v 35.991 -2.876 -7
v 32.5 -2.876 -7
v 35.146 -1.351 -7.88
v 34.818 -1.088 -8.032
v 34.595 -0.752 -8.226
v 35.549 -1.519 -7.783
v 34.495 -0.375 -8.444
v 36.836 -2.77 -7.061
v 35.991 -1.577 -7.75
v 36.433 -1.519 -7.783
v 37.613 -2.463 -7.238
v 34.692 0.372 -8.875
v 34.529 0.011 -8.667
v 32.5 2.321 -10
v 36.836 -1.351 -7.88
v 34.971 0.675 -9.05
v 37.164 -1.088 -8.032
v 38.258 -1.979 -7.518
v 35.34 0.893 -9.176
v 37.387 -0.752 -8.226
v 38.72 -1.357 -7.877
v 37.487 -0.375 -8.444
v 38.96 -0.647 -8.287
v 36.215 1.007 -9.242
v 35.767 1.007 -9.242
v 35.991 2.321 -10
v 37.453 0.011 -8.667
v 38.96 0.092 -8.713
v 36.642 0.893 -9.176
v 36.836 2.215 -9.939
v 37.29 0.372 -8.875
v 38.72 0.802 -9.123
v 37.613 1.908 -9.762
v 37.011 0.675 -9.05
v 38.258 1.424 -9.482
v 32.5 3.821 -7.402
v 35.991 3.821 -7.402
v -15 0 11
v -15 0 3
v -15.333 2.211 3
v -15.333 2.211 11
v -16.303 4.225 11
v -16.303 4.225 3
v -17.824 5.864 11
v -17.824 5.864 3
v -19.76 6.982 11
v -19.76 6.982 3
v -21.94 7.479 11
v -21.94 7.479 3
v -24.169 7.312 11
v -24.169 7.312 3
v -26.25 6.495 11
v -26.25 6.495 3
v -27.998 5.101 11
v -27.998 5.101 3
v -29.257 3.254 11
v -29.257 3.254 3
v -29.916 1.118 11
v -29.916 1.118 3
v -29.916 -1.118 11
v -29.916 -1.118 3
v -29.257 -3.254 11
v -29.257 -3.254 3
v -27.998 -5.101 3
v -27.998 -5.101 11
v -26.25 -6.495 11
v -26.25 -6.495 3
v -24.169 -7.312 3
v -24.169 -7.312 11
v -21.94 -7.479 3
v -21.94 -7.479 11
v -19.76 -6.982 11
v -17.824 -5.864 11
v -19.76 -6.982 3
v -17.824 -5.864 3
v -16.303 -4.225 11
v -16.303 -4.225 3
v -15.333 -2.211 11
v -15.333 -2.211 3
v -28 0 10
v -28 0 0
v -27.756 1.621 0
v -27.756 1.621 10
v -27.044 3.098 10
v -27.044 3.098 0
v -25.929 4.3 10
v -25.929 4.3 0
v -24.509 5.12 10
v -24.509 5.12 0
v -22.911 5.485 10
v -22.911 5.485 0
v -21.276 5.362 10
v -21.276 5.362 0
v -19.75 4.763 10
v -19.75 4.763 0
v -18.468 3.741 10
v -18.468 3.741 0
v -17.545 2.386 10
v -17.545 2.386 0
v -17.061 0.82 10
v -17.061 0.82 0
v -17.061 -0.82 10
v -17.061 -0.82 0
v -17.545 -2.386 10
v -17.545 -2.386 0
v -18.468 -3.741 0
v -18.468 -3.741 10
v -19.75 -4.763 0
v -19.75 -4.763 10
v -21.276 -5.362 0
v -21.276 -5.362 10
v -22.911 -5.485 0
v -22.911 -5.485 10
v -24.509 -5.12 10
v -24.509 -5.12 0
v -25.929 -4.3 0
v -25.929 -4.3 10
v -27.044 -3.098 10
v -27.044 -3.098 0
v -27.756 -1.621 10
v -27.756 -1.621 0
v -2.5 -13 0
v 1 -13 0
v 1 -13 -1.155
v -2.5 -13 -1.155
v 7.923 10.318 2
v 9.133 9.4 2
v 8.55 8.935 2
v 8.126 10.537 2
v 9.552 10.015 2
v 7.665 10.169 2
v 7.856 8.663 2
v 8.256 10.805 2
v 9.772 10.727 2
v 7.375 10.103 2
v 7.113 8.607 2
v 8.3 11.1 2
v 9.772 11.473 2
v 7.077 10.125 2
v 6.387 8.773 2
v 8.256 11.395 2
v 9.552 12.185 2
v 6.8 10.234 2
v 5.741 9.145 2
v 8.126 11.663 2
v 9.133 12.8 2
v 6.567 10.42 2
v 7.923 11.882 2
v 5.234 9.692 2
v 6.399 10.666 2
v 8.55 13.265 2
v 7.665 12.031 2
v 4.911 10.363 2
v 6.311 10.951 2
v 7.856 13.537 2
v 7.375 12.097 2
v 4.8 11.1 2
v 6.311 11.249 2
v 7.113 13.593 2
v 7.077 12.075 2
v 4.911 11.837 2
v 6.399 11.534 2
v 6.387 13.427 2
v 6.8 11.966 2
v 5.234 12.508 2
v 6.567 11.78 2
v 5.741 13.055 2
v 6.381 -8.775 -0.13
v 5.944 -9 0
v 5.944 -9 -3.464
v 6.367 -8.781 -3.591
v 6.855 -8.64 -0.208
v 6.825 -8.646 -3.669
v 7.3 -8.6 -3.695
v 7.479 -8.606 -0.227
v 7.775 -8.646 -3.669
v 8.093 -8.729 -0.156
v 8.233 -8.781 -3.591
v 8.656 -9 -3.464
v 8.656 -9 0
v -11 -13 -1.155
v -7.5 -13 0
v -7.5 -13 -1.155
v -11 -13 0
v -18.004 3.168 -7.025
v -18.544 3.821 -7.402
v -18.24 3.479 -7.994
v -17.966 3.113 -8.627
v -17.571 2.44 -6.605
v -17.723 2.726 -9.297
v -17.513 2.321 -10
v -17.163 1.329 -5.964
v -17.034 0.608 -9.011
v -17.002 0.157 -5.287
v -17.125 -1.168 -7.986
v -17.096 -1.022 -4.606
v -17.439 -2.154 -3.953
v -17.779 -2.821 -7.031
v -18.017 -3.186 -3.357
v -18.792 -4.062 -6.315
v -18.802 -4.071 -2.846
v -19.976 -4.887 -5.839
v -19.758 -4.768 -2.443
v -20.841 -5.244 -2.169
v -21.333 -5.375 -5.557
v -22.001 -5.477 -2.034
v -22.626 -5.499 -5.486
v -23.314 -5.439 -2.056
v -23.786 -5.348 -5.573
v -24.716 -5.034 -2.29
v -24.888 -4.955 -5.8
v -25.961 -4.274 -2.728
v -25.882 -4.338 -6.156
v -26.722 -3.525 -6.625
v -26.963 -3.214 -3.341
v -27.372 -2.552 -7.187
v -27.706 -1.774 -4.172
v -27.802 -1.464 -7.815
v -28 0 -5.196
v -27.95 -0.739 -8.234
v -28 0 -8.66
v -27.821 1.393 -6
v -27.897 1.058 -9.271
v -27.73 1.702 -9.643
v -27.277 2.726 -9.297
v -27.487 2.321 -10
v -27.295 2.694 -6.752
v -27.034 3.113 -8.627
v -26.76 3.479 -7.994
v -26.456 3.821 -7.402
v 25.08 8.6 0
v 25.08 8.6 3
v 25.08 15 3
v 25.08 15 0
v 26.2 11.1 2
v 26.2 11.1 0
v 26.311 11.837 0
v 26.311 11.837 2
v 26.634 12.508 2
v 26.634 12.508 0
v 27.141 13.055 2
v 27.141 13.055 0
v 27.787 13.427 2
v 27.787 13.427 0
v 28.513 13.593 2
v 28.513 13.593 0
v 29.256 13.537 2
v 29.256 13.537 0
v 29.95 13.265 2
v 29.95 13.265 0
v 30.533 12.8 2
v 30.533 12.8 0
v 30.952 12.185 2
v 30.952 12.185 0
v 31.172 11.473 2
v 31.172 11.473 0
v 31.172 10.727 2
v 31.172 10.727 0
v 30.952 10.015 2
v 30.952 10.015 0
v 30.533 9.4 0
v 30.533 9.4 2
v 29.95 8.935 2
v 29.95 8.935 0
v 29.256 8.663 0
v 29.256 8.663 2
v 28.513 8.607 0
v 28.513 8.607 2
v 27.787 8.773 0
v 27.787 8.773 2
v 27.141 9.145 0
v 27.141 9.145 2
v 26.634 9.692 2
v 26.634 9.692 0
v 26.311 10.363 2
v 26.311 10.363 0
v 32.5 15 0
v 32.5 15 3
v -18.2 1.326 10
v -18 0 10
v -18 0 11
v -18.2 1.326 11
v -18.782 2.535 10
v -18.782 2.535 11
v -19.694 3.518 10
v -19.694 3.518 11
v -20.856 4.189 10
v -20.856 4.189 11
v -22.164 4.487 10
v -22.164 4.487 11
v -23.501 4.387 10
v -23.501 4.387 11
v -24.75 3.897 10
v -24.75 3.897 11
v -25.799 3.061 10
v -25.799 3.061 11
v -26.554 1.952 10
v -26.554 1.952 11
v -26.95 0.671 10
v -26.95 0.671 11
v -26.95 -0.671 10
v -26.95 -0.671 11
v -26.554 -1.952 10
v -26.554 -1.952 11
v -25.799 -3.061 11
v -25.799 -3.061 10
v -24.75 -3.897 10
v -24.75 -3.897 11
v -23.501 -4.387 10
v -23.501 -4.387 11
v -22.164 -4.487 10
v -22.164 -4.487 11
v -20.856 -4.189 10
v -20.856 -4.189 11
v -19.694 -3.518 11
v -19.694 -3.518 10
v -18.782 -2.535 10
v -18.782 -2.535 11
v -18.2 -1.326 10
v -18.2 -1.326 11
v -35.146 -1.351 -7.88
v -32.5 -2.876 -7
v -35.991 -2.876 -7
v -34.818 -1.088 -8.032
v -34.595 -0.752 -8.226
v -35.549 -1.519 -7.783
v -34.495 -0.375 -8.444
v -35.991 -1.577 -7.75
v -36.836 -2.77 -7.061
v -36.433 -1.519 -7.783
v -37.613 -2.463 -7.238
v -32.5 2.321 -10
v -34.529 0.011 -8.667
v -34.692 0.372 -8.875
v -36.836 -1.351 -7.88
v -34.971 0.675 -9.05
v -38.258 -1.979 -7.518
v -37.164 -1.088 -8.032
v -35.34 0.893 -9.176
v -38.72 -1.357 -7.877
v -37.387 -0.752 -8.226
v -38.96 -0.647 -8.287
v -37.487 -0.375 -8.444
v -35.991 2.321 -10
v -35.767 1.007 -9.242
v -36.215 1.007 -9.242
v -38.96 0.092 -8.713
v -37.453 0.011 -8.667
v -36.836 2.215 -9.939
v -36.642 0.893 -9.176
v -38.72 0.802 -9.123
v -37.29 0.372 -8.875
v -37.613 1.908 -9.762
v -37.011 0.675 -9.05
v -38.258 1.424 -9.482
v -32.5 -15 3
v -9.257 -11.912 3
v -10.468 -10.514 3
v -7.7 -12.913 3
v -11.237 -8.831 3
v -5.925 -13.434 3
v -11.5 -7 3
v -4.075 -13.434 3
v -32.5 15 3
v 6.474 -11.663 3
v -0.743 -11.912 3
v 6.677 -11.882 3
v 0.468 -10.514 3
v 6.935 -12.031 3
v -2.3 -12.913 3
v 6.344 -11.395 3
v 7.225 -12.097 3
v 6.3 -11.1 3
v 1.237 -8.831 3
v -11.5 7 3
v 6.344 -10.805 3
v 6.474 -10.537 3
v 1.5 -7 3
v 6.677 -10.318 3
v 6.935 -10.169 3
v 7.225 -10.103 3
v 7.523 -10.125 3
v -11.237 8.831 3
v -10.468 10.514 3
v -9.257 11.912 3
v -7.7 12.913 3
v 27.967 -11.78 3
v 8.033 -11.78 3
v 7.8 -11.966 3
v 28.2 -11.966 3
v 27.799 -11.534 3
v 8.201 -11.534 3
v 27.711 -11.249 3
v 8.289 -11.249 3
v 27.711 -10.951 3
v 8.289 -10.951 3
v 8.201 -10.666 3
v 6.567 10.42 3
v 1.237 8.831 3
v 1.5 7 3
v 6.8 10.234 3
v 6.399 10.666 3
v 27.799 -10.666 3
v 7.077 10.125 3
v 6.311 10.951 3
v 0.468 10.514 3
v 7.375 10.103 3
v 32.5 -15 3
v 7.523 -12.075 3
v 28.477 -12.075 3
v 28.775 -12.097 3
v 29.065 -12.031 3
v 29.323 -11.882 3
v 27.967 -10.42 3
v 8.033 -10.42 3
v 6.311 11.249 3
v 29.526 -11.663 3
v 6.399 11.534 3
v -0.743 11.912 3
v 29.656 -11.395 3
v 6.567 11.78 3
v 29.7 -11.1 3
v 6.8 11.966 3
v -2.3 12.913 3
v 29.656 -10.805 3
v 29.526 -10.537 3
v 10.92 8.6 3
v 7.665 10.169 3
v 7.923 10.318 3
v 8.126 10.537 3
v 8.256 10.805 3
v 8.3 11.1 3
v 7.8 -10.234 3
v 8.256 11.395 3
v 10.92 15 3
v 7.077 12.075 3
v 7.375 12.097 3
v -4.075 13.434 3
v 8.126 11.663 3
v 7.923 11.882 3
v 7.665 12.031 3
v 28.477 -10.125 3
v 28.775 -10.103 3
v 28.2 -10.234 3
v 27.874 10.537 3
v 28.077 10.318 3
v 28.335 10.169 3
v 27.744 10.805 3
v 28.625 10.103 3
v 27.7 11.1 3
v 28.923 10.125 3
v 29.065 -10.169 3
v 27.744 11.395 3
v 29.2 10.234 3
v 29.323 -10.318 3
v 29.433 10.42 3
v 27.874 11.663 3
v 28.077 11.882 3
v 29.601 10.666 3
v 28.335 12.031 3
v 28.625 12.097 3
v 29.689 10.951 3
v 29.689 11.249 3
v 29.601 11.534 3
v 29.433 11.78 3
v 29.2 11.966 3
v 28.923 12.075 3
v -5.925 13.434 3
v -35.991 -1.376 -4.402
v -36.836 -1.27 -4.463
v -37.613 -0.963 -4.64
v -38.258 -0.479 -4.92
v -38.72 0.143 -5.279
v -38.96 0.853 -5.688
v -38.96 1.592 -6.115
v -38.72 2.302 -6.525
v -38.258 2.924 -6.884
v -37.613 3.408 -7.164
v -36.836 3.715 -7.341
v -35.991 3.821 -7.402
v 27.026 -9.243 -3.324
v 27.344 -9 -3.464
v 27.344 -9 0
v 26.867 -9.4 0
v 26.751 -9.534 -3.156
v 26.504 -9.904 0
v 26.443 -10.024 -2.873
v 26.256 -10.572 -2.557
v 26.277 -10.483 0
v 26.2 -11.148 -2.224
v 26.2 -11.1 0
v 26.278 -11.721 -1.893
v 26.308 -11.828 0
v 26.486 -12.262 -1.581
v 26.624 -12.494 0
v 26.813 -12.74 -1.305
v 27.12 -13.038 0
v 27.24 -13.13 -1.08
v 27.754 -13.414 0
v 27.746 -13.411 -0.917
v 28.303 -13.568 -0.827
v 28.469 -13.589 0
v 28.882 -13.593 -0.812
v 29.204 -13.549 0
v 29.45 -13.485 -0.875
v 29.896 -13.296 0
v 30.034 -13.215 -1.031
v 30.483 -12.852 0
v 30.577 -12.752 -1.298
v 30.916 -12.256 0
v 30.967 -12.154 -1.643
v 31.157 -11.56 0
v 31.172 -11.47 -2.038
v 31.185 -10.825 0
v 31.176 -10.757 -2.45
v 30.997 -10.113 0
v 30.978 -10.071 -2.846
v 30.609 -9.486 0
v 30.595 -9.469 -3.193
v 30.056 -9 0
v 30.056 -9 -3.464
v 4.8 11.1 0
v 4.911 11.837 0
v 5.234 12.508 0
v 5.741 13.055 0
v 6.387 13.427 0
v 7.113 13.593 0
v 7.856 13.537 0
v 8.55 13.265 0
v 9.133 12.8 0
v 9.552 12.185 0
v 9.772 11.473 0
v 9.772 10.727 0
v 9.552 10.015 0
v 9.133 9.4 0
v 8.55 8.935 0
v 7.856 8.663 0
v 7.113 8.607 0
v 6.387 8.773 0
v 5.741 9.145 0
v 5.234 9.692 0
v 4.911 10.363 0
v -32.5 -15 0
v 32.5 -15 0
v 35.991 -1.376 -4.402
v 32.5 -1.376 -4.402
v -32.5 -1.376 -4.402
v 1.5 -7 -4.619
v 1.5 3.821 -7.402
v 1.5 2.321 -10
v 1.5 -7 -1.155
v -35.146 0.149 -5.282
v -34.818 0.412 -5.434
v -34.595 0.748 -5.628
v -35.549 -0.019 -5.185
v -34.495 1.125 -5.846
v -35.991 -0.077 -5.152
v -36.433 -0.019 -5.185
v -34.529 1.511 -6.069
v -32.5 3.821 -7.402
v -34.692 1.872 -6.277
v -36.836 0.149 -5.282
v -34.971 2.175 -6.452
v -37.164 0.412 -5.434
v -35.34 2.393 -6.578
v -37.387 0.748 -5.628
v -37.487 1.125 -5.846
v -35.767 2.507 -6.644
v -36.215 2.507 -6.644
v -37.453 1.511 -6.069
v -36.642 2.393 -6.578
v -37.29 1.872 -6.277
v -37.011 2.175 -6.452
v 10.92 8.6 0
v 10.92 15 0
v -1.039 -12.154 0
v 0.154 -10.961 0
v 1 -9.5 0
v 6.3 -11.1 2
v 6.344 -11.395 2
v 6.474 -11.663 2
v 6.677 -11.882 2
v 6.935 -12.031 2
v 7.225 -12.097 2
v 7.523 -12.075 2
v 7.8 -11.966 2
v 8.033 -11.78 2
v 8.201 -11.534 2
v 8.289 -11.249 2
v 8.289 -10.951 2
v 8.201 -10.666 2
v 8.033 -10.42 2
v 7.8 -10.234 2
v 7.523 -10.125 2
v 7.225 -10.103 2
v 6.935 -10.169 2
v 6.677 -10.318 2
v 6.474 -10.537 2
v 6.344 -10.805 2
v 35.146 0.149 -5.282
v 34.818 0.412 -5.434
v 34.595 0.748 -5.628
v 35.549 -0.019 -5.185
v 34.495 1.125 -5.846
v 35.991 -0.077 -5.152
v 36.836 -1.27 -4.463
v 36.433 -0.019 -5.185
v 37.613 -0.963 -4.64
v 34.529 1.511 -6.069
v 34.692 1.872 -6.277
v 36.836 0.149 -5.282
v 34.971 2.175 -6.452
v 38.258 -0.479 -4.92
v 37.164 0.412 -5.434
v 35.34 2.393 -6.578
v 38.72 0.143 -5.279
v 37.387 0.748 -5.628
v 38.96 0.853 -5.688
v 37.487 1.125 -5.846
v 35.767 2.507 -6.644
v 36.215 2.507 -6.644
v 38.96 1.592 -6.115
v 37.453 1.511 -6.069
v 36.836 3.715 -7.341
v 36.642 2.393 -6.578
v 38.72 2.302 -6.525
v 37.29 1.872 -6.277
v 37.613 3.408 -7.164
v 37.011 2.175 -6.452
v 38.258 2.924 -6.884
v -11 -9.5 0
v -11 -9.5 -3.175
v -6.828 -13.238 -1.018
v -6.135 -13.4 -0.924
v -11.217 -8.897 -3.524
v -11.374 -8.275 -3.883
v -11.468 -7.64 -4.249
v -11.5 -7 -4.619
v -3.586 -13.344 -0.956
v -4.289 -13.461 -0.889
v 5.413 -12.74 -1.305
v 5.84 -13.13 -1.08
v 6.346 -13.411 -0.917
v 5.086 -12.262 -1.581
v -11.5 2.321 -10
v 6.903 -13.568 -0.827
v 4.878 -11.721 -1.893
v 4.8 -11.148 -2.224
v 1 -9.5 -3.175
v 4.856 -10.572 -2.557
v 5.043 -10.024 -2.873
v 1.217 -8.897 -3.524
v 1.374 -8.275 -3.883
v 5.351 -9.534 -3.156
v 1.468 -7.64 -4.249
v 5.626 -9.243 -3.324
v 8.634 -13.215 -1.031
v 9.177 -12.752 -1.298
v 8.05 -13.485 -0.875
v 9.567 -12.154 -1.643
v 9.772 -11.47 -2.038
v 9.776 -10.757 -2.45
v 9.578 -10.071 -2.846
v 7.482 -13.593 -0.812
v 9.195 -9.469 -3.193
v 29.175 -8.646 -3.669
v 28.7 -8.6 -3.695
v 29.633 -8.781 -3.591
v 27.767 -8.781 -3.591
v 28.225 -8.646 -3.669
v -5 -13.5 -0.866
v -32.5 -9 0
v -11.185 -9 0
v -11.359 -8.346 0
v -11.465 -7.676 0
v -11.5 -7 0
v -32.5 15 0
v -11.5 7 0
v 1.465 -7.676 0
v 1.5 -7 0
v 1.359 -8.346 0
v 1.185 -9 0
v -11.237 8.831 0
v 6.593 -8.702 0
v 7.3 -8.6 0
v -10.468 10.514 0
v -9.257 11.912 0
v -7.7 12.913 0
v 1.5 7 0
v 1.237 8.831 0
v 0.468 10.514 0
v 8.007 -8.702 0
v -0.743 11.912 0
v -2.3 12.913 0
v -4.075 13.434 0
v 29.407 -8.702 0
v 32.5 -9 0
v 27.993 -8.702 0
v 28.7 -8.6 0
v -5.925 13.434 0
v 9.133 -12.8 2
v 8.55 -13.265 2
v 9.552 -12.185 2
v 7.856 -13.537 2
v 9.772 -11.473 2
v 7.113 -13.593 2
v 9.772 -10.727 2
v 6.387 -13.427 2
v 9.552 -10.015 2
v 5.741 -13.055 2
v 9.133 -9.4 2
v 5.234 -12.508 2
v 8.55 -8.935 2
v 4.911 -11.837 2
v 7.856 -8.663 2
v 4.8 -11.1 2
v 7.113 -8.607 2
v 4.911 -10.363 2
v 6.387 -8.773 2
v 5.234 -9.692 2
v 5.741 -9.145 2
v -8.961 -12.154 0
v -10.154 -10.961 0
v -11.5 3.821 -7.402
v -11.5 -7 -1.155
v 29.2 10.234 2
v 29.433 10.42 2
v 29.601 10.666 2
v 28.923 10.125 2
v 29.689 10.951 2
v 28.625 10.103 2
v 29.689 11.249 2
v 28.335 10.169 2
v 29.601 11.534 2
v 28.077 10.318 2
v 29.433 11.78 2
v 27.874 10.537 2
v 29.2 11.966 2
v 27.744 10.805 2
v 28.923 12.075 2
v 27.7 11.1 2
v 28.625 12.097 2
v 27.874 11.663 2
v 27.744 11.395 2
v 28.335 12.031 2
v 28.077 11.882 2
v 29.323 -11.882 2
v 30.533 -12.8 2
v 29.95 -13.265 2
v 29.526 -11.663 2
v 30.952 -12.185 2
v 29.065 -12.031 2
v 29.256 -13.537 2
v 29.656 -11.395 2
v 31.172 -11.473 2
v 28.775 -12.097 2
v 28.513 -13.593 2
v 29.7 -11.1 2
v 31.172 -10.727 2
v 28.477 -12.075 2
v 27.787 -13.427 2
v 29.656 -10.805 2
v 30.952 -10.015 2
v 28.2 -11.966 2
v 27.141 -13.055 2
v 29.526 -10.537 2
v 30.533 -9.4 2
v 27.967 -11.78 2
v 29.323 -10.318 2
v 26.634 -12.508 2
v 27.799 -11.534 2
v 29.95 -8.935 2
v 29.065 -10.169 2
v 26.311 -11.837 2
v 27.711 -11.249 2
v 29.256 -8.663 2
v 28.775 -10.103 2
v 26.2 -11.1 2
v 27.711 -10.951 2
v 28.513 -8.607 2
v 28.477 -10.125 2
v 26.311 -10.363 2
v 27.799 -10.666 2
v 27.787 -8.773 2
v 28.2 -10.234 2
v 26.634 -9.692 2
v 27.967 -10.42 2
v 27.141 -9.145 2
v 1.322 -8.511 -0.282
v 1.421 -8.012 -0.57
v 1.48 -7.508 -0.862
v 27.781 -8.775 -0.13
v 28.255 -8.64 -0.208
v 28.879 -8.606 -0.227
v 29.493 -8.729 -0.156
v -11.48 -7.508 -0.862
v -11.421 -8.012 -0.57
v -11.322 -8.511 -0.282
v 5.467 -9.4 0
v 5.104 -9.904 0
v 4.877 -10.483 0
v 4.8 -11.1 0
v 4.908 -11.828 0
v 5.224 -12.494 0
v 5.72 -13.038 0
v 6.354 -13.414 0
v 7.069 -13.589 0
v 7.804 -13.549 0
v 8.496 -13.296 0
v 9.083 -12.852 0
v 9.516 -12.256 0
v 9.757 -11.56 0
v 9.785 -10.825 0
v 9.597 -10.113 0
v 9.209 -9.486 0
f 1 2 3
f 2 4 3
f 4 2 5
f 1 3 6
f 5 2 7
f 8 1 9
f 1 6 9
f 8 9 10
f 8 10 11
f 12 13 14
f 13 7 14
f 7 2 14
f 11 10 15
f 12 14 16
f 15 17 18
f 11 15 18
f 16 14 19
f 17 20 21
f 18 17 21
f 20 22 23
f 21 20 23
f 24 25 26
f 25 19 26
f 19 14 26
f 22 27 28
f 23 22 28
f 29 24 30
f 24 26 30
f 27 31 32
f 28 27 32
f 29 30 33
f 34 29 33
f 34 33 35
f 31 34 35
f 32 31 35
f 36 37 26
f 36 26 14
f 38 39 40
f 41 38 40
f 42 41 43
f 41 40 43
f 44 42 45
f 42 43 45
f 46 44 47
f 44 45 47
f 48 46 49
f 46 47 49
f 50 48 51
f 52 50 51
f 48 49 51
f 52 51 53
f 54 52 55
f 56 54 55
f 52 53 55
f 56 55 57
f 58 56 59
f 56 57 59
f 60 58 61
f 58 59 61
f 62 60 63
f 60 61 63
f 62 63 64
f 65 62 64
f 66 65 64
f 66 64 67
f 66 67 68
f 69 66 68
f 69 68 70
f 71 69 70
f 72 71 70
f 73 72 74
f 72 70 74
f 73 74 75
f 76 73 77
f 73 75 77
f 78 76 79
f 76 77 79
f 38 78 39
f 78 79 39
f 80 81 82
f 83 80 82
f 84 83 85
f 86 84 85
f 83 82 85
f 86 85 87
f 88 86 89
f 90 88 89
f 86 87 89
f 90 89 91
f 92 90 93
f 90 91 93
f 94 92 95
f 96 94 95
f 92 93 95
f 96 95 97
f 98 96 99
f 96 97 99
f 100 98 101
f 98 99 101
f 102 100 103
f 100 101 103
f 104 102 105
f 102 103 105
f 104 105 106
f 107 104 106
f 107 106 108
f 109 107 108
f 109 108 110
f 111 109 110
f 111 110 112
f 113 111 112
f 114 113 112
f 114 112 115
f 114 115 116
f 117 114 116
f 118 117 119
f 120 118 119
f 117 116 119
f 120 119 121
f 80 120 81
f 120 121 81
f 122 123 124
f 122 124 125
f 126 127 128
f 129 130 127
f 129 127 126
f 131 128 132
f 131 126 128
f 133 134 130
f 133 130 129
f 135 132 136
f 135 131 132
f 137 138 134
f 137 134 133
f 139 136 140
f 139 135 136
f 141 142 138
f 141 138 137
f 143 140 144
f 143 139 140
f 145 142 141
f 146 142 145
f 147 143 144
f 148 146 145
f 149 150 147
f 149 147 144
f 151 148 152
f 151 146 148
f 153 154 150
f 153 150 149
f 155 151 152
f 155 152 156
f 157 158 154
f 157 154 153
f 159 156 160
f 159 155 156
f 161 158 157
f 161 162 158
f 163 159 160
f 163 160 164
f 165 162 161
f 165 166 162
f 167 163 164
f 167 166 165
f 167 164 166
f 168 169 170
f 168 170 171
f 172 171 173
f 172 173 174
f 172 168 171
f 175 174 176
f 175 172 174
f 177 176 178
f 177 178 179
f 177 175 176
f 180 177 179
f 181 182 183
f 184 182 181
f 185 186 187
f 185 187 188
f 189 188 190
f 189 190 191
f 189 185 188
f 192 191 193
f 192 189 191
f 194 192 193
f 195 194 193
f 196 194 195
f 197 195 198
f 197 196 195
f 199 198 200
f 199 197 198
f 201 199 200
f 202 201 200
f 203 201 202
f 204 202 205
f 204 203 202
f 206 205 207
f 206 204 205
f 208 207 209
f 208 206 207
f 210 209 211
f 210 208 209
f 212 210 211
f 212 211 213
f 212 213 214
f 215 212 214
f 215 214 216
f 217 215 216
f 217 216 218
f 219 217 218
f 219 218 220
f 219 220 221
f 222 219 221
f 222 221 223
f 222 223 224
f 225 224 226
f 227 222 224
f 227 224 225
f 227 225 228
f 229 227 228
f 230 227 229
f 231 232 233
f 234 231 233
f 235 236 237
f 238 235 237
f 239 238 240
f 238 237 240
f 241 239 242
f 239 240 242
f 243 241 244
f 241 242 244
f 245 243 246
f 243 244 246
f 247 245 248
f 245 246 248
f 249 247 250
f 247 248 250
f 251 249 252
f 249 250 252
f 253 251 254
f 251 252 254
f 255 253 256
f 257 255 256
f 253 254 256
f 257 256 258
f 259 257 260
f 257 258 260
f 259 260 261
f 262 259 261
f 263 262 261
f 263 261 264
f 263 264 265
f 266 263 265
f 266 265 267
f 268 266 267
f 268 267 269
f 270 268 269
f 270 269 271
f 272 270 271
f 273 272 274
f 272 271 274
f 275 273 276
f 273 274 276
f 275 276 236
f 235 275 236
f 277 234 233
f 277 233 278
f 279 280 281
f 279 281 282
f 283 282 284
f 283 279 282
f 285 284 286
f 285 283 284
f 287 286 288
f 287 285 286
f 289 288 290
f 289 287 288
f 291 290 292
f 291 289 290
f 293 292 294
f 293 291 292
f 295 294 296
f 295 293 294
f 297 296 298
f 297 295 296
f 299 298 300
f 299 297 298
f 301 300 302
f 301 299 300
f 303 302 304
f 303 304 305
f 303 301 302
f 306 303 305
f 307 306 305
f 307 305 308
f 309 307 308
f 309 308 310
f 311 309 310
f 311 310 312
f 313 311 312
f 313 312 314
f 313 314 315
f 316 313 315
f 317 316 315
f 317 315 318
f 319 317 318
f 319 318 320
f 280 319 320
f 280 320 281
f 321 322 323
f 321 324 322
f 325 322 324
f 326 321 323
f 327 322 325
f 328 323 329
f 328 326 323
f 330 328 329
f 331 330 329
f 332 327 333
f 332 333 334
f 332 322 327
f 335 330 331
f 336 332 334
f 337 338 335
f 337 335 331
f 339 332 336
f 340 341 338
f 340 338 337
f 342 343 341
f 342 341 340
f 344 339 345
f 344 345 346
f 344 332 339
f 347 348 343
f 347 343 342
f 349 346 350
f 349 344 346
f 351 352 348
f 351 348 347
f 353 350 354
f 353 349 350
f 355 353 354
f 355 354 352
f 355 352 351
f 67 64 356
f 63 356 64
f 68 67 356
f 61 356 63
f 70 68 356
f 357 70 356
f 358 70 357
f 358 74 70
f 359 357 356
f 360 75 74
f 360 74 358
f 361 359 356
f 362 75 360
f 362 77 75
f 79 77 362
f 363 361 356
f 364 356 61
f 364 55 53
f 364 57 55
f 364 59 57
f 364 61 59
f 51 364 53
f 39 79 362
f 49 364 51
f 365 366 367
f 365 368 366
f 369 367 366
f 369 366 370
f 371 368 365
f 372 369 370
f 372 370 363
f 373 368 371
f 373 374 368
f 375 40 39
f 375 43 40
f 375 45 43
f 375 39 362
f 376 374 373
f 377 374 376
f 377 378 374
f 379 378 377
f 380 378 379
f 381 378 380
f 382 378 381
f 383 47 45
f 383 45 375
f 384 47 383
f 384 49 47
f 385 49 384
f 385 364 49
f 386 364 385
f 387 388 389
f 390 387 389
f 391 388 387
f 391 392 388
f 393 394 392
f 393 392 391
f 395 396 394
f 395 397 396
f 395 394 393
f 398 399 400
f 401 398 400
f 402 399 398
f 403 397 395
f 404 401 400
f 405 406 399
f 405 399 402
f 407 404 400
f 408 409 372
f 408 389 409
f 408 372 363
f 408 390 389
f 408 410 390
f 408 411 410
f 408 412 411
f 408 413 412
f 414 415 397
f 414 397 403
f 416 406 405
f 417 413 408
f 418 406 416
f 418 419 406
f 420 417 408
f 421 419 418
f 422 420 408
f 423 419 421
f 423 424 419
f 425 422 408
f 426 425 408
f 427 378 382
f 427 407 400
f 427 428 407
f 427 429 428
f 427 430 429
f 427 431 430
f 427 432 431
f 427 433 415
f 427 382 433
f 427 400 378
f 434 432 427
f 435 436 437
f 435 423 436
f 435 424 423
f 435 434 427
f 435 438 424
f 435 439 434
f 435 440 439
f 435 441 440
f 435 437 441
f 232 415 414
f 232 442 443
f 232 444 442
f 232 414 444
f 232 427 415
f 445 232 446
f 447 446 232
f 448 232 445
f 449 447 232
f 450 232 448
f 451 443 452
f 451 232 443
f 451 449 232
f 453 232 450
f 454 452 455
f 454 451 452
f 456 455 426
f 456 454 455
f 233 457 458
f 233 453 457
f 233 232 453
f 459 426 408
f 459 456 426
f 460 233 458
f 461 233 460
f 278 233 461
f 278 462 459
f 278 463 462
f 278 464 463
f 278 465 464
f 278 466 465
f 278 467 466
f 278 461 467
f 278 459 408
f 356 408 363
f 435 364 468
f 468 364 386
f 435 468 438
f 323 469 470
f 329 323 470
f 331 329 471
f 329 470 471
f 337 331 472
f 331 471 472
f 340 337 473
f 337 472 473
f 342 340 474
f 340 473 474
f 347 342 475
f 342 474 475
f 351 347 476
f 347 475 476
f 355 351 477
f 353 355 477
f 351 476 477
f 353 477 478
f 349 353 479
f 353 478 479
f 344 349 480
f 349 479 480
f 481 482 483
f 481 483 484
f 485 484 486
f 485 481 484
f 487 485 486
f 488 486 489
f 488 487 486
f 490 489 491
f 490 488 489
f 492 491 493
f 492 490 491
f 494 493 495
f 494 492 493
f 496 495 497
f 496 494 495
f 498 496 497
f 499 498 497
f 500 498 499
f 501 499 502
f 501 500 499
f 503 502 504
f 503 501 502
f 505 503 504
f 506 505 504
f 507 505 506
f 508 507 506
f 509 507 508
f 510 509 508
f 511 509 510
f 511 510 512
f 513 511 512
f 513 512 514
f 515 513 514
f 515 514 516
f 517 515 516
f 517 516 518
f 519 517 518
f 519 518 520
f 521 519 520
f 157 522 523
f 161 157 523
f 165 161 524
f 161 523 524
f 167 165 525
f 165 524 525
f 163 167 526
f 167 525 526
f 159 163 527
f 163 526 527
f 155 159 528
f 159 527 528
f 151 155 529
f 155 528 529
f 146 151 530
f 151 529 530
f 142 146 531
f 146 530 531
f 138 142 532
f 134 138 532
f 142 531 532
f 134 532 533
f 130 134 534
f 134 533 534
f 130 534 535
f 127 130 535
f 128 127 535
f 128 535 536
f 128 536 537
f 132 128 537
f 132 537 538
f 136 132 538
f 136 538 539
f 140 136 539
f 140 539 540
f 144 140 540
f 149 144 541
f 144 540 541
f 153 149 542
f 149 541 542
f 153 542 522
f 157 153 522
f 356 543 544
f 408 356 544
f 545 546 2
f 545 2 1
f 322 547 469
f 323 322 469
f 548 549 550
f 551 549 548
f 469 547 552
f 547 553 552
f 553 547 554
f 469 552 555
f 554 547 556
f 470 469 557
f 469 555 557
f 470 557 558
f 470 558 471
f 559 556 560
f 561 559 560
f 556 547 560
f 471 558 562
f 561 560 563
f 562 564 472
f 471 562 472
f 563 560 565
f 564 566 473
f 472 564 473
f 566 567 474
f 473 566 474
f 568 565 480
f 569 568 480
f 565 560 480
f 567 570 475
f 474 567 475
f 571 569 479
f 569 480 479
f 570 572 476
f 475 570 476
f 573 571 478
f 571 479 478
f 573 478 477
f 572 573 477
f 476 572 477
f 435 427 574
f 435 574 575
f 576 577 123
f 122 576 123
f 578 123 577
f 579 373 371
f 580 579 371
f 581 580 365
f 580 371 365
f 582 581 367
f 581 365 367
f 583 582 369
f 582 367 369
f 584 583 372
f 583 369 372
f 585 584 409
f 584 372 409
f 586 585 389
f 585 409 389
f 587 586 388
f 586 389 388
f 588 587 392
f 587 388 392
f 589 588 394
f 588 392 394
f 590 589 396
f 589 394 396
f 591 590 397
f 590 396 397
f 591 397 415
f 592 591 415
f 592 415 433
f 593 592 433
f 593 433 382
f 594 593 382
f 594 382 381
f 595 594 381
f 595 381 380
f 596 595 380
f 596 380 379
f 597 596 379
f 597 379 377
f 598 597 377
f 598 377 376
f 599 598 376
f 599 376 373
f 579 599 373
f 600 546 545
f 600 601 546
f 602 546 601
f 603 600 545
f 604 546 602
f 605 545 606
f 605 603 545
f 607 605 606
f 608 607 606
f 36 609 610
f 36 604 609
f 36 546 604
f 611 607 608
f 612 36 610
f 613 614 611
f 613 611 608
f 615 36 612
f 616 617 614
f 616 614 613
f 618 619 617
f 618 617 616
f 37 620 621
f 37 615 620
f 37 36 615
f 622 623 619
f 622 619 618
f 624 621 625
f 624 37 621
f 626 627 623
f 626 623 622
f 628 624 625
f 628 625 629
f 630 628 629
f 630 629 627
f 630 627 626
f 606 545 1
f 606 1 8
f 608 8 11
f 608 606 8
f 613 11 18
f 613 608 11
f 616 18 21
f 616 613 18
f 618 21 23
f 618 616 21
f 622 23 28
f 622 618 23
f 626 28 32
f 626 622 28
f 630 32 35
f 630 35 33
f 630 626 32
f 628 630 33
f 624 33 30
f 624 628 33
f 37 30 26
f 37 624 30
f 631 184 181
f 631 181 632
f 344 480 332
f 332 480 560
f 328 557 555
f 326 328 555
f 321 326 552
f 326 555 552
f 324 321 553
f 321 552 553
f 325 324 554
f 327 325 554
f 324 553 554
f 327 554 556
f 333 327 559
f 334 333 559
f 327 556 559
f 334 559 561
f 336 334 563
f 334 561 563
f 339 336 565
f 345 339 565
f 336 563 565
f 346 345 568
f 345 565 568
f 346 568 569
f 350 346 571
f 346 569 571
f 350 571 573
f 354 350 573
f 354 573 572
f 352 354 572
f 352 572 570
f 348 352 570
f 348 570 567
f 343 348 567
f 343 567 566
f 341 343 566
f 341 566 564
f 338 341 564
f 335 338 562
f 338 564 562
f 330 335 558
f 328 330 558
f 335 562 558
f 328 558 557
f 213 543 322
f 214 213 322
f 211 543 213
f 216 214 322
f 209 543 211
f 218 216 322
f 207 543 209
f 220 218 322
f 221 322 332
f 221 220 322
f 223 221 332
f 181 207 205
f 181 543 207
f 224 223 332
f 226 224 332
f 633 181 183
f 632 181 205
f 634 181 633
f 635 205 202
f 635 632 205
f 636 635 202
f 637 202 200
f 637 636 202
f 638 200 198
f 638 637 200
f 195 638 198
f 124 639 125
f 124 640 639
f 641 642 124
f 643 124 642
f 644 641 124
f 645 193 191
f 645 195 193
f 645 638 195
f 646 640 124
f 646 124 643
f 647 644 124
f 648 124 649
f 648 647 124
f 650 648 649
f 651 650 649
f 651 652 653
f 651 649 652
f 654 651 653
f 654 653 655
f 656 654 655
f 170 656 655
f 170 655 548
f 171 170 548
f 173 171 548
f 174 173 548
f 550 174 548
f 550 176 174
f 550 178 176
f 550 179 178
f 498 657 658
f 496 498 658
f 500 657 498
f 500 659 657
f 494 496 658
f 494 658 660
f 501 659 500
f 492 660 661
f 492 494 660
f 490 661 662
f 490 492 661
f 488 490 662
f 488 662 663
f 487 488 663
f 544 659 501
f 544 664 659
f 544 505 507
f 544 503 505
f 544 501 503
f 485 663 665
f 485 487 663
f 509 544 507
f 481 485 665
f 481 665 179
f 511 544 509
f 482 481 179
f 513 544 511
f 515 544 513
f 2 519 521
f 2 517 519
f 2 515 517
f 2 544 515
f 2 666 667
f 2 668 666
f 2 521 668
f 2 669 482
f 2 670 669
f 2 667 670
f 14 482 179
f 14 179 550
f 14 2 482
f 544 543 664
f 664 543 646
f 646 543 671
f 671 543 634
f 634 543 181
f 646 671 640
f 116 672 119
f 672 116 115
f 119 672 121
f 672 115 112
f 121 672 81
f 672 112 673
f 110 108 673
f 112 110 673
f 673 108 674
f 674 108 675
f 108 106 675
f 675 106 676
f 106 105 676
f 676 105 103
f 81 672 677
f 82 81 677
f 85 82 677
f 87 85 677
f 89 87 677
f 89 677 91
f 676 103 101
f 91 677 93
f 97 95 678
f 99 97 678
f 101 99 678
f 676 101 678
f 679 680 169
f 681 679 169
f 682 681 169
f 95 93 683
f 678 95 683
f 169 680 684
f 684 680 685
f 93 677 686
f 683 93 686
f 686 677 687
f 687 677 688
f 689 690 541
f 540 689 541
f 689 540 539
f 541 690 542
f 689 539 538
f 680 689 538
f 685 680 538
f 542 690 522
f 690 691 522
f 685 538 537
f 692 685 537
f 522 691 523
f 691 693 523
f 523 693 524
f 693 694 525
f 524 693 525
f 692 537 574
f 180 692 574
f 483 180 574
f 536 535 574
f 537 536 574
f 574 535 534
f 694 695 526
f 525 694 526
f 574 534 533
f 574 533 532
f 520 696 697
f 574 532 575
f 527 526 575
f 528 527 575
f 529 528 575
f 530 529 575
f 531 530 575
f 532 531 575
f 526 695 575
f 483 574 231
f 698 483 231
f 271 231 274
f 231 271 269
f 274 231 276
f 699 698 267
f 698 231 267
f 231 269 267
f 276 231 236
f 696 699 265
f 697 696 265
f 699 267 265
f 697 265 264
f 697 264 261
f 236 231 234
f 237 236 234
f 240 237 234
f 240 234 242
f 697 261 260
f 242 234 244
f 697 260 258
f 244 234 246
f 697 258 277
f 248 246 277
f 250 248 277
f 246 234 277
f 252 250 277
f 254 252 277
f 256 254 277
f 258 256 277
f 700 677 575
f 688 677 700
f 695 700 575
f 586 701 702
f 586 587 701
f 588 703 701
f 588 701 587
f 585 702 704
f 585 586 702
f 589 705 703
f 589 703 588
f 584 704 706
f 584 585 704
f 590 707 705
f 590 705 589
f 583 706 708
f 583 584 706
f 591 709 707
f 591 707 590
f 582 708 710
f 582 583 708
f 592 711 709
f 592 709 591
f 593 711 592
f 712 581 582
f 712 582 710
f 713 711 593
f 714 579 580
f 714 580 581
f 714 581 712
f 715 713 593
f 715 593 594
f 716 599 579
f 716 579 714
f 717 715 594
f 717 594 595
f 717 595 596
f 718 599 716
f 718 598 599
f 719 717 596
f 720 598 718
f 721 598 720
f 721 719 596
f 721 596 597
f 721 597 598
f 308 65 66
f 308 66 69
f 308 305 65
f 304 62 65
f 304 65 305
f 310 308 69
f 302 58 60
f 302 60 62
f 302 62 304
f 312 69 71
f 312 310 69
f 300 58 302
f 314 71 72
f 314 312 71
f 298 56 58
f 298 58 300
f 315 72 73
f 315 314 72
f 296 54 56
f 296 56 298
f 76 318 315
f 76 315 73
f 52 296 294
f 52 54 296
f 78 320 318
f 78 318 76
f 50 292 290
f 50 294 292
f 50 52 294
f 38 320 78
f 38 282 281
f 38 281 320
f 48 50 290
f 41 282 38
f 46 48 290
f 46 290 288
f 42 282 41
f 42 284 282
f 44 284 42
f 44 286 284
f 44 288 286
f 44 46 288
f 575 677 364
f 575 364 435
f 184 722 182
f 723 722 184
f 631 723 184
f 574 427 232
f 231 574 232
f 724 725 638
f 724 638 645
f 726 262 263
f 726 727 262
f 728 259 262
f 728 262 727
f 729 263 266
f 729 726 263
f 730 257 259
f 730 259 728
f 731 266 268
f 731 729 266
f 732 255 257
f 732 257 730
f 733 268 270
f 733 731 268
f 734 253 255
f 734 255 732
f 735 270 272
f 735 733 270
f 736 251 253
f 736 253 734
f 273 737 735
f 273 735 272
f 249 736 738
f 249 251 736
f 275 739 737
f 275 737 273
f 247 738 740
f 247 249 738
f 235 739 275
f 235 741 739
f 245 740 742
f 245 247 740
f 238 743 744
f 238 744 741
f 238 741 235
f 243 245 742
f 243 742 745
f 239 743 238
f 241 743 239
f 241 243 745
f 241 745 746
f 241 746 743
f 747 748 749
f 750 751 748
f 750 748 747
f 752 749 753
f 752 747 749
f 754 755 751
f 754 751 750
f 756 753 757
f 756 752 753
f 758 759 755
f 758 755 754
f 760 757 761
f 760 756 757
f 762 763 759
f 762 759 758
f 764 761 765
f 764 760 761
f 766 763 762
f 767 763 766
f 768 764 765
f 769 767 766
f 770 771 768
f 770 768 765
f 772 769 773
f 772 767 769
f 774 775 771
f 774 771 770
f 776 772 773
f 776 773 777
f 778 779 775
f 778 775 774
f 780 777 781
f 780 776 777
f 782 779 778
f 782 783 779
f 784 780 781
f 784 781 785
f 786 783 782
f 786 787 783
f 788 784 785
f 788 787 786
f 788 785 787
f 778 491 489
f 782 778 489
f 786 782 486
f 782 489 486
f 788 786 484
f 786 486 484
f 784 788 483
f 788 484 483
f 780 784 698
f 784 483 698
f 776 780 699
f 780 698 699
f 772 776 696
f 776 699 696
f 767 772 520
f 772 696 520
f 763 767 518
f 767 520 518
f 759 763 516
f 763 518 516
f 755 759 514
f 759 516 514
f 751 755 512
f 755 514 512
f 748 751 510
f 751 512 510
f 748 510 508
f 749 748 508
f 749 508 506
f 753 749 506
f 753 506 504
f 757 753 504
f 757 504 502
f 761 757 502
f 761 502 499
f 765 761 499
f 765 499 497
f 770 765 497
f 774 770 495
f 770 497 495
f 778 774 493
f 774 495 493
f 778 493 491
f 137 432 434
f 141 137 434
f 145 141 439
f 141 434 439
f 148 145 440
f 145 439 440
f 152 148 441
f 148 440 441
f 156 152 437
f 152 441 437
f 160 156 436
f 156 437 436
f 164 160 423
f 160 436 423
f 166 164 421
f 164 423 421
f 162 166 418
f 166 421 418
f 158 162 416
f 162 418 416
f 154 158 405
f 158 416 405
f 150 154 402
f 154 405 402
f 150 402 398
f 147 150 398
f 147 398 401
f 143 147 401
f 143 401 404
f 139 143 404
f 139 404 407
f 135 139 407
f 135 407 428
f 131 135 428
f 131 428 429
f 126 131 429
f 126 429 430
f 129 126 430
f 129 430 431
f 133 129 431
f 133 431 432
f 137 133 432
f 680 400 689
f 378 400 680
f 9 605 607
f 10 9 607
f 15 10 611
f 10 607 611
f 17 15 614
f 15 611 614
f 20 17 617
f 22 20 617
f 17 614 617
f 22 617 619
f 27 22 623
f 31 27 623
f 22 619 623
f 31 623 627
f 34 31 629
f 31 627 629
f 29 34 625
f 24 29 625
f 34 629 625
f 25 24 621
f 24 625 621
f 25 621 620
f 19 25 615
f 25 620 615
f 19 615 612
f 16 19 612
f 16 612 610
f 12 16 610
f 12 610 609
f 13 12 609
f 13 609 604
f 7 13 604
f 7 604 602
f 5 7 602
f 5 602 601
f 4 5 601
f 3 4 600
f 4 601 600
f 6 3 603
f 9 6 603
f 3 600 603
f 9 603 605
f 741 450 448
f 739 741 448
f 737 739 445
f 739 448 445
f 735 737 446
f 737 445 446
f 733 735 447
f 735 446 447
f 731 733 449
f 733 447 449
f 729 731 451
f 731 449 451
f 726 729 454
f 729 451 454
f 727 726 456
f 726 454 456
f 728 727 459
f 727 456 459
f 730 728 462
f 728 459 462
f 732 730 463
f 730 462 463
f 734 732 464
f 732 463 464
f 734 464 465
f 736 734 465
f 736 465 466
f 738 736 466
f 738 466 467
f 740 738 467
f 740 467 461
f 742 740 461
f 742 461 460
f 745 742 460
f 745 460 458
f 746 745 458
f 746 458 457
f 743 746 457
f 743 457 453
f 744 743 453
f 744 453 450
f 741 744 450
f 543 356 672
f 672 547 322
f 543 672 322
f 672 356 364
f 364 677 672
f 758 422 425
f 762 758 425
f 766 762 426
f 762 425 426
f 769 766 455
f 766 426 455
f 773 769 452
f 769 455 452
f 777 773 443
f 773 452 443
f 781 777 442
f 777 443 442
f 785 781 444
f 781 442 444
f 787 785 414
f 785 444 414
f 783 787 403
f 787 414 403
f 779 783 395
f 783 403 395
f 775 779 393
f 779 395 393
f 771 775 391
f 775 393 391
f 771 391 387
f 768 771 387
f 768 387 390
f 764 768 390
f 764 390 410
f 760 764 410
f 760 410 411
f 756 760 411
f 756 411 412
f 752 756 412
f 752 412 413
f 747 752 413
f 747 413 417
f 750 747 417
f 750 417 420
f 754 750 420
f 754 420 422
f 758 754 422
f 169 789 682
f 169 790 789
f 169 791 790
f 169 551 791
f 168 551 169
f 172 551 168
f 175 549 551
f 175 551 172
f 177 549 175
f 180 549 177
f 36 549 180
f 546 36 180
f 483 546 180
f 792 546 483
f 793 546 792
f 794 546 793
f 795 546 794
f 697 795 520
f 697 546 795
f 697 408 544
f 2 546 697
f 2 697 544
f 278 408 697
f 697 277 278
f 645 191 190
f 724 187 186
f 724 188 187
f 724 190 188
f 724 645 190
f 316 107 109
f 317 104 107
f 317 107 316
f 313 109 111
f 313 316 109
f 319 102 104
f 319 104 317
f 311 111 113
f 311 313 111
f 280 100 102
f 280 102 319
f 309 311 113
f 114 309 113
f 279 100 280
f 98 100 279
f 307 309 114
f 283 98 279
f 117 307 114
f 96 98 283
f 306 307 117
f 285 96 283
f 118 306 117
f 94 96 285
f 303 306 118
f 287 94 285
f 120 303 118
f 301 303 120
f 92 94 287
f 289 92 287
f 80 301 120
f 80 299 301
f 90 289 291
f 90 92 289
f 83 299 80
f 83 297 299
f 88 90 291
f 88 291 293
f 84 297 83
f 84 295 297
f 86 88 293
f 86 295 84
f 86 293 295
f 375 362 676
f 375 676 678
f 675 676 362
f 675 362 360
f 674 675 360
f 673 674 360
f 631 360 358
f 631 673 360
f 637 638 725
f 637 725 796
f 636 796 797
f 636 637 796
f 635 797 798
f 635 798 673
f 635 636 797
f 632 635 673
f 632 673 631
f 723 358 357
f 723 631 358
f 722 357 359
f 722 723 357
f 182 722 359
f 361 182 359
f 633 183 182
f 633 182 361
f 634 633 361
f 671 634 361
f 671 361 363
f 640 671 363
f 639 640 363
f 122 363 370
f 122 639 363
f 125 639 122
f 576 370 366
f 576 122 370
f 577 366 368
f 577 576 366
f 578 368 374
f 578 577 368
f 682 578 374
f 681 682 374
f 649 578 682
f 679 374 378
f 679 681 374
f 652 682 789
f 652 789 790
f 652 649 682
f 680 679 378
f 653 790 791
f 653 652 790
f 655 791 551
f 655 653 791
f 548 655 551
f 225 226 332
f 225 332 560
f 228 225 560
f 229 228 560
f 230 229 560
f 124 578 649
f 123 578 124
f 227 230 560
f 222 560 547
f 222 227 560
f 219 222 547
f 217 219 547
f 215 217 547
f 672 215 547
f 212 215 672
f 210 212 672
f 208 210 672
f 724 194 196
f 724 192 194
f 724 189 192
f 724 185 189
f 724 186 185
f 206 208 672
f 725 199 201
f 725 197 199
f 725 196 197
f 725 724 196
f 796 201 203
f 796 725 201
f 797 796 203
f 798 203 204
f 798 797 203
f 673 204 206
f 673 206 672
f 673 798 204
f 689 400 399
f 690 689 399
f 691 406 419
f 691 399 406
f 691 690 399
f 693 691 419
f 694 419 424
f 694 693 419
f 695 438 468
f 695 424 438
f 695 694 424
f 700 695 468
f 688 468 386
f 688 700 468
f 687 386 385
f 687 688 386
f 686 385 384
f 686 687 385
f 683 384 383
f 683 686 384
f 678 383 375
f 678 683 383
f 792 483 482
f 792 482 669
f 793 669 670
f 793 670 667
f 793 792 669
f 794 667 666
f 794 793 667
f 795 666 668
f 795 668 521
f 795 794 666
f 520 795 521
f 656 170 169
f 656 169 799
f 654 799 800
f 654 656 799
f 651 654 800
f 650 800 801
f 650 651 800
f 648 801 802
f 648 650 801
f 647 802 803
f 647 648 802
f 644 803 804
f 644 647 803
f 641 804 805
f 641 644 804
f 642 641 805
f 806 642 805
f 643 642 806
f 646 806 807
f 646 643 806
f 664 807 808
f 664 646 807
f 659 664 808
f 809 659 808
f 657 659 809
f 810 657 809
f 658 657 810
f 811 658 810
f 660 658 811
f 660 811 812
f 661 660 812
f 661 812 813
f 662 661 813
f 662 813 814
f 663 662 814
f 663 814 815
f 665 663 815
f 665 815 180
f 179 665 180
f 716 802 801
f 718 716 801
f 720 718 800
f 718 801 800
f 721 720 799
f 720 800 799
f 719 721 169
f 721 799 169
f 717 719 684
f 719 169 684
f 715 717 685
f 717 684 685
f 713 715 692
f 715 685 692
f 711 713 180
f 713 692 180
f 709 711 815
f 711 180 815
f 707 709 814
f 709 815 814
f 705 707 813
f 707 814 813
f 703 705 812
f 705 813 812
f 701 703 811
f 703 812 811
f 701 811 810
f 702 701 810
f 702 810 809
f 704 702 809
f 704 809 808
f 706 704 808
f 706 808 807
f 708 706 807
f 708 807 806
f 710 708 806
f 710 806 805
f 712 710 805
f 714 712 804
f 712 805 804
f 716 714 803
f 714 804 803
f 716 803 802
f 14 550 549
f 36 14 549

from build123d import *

# Parameters (mm, degrees)
SKETCH1_W               = 65
SKETCH1_H               = 30
BOSS_EXTRUDE1_DEPTH     = 3
SKETCH2_R               = 1
CUT_EXTRUDE1_DEPTH      = 5
SKETCH3_R               = 2.5
CUT_EXTRUDE2_DEPTH      = 2
SKETCH4_W               = 14.16
SKETCH4_H               = 6.4
CUT_EXTRUDE3_DEPTH      = 10
BOSS_EXTRUDE2_DEPTH     = 65
CUT_EXTRUDE4_START      = -60
CUT_EXTRUDE4_DEPTH      = 60
SKETCH7_R               = 1.5
BOSS_EXTRUDE3_DEPTH     = 3
BOSS_EXTRUDE3_2_DEPTH   = 3
CUT_EXTRUDE5_DEPTH      = 44.752699359
CUT_EXTRUDE5_DEPTH_BACK = 44.752699359
SKETCH8_R               = 6.5
CUT_EXTRUDE6_DEPTH      = 43.956940082
CUT_EXTRUDE6_DEPTH_BACK = 43.956940082
CUT_EXTRUDE7_DEPTH      = 3.175426481
CUT_EXTRUDE8_START      = 2
CUT_EXTRUDE8_DEPTH      = 3.695041823
SKETCH12_R              = 4.5
CUT_EXTRUDE9_DEPTH      = 44.752699359
SKETCH14_R              = 5.5
CUT_EXTRUDE10_DEPTH     = 43.956940082
SKETCH15_R              = 7.5
SKETCH15_R_2            = 4.5
BOSS_EXTRUDE4_DEPTH     = 8
SKETCH16_R              = 5.5
CUT_EXTRUDE11_DEPTH     = 10


# Read off the part's stored shape, not the designer's step: Cut-Extrude7, Cut-Extrude8
with BuildPart() as part:
    # Sketch1 → Boss-Extrude1 (new body)
    with BuildSketch(Plane.XY):
        Rectangle(SKETCH1_W, SKETCH1_H)
    extrude(amount=BOSS_EXTRUDE1_DEPTH)

    # Sketch2 → Cut-Extrude1 (cut)
    with BuildSketch(Plane.XY.offset(3)):
        with Locations((7.3, 11.1)):
            Circle(SKETCH2_R)
        with Locations(Location((28.7, 11.1, 0), (0, 0, 180))):
            Circle(SKETCH2_R)
        with Locations((28.7, -11.1)):
            Circle(SKETCH2_R)
        with Locations(Location((7.3, -11.1, 0), (0, 0, 180))):
            Circle(SKETCH2_R)
    extrude(amount=-CUT_EXTRUDE1_DEPTH, mode=Mode.SUBTRACT)

    # Sketch3 → Cut-Extrude2 (cut)
    with BuildSketch(Plane(origin=(0, 0, 0), x_dir=(-1, 0, 0), z_dir=(0, 0, -1))):
        with Locations((-7.3, 11.1)):
            Circle(SKETCH3_R)
        with Locations((-28.7, 11.1)):
            Circle(SKETCH3_R)
        with Locations((-28.7, -11.1)):
            Circle(SKETCH3_R)
        with Locations((-7.3, -11.1)):
            Circle(SKETCH3_R)
    extrude(amount=-CUT_EXTRUDE2_DEPTH, mode=Mode.SUBTRACT)

    # Sketch4 → Cut-Extrude3 (cut)
    with BuildSketch(Plane.XY.offset(3)):
        with Locations((18, 11.8)):
            Rectangle(SKETCH4_W, SKETCH4_H)
    extrude(amount=-CUT_EXTRUDE3_DEPTH, mode=Mode.SUBTRACT)

    # Sketch5 → Boss-Extrude2 (add)
    with BuildSketch(Plane(origin=(32.5, 0, 0), x_dir=(0, 0, -1), z_dir=(1, 0, 0))):
        Polygon((0, -15), (10, 2.320508076), (7.401923789, 3.820508076), (0, -9), align=None)
    extrude(amount=-BOSS_EXTRUDE2_DEPTH)

    # Sketch6 → Cut-Extrude4 (cut)
    with BuildSketch(Plane.XY.offset(CUT_EXTRUDE4_START)):
        with BuildLine():
            Line((8.656465997, -9), (5.943534003, -9))
            ThreePointArc((5.943534003, -9), (7.3, -13.6), (8.656465997, -9))
        make_face()
        with BuildLine():
            Line((30.056465997, -9), (27.343534003, -9))
            ThreePointArc((27.343534003, -9), (28.7, -13.6), (30.056465997, -9))
        make_face()
    extrude(amount=CUT_EXTRUDE4_DEPTH, mode=Mode.SUBTRACT)


with BuildPart() as body_2:
    # Sketch7 → Boss-Extrude3 (new body)
    with BuildSketch(Plane(origin=(0, -2.25, -3.897114317), x_dir=(1, 0, 0), z_dir=(0, 0.49999999999999445, 0.8660254037844419))):
        with BuildLine():
            Line((-35.991007953, 7.009618943), (-32.5, 7.009618943))
            Line((-32.5, 7.009618943), (-32.5, 1.009618943))
            Line((-32.5, 1.009618943), (-35.991007953, 1.009618943))
            ThreePointArc((-35.991007953, 1.009618943), (-38.991007953, 4.009618943), (-35.991007953, 7.009618943))
        make_face()
        with Locations(Location((-35.991007953, 4.009618943, 0), (0, 0, 270))):
            Circle(SKETCH7_R, mode=Mode.SUBTRACT)
    extrude(amount=-BOSS_EXTRUDE3_DEPTH)


with BuildPart() as body_3:
    # Sketch7 → Boss-Extrude3 2 (new body)
    with BuildSketch(Plane(origin=(0, -2.25, -3.897114317), x_dir=(1, 0, 0), z_dir=(0, 0.49999999999999445, 0.8660254037844419))):
        with BuildLine():
            Line((35.991007953, 7.009618943), (32.5, 7.009618943))
            Line((32.5, 7.009618943), (32.5, 1.009618943))
            Line((32.5, 1.009618943), (35.991007953, 1.009618943))
            ThreePointArc((35.991007953, 1.009618943), (38.991007953, 4.009618943), (35.991007953, 7.009618943))
        make_face()
        with Locations(Location((35.991007953, 4.009618943, 0), (0, 0, 270))):
            Circle(SKETCH7_R, mode=Mode.SUBTRACT)
    extrude(amount=-BOSS_EXTRUDE3_2_DEPTH)

    # Combine1: union part, body 2
    add(part.part)
    add(body_2.part)

    # Sketch8 → Cut-Extrude5 (cut, two sides: drawn at the far end of the back side and taken through both)
    with BuildSketch(Plane.XY.offset(3).offset(-CUT_EXTRUDE5_DEPTH_BACK)):
        with Locations(Location((-5, 7, 0), (0, 0, 180))):
            Circle(SKETCH8_R)
        with Locations(Location((-5, -7, 0), (0, 0, 270))):
            Circle(SKETCH8_R)
    extrude(amount=CUT_EXTRUDE5_DEPTH + CUT_EXTRUDE5_DEPTH_BACK, mode=Mode.SUBTRACT)

    # Sketch9 → Cut-Extrude6 (cut, two sides: drawn at the far end of the back side and taken through both)
    with BuildSketch(Plane(origin=(0, 0, 0), x_dir=(-1, 0, 0), z_dir=(0, 0, -1)).offset(-CUT_EXTRUDE6_DEPTH_BACK)):
        with BuildLine():
            Line((-1.5, 7), (-1.5, -7))
            ThreePointArc((-1.5, -7), (5, -13.5), (11.5, -7))
            Line((11.5, -7), (11.5, 7))
            ThreePointArc((11.5, 7), (5, 13.5), (-1.5, 7))
        make_face()
    extrude(amount=CUT_EXTRUDE6_DEPTH + CUT_EXTRUDE6_DEPTH_BACK, mode=Mode.SUBTRACT)

    # Cut-Extrude7 outline → Cut-Extrude7 (cut)
    with BuildSketch(Plane(origin=(0, 0, 0), x_dir=(-1, 0, 0), z_dir=(0, 0, -1))):
        with BuildLine():
            Line((-1, -13), (2.5, -13))
            ThreePointArc((2.5, -13), (0.403805922, -11.596194078), (-1, -9.5))
            Line((-1, -9.5), (-1, -13))
        make_face()
        with BuildLine():
            Line((11, -13), (11, -9.5))
            ThreePointArc((11, -9.5), (9.596194078, -11.596194078), (7.5, -13))
            Line((7.5, -13), (11, -13))
        make_face()
    extrude(amount=CUT_EXTRUDE7_DEPTH, mode=Mode.SUBTRACT)

    # Cut-Extrude8 outline → Cut-Extrude8 (cut)
    with BuildSketch(Plane(origin=(0, 0, 2), x_dir=(-1, 0, 0), z_dir=(0, 0, -1)).offset(CUT_EXTRUDE8_START)):
        with BuildLine():
            Line((-8.656465997, -9), (-5.943534003, -9))
            ThreePointArc((-5.943534003, -9), (-7.3, -8.6), (-8.656465997, -9))
        make_face()
        with BuildLine():
            Line((-30.056465997, -9), (-27.343534003, -9))
            ThreePointArc((-27.343534003, -9), (-28.7, -8.6), (-30.056465997, -9))
        make_face()
    extrude(amount=CUT_EXTRUDE8_DEPTH, mode=Mode.SUBTRACT)

    # Sketch12 → Cut-Extrude9 (cut, through all)
    with BuildSketch(Plane.XY.offset(3)):
        with Locations((-22.5, 0)):
            Circle(SKETCH12_R)
    extrude(amount=-CUT_EXTRUDE9_DEPTH, mode=Mode.SUBTRACT)

    # Sketch14 → Cut-Extrude10 (cut, through all)
    with BuildSketch(Plane(origin=(0, 0, 0), x_dir=(-1, 0, 0), z_dir=(0, 0, -1))):
        with Locations((22.5, 0)):
            Circle(SKETCH14_R)
    extrude(amount=CUT_EXTRUDE10_DEPTH, mode=Mode.SUBTRACT)

    # Sketch15 → Boss-Extrude4 (add)
    with BuildSketch(Plane.XY.offset(3)):
        with Locations((-22.5, 0)):
            Circle(SKETCH15_R)
        with Locations((-22.5, 0)):
            Circle(SKETCH15_R_2, mode=Mode.SUBTRACT)
    extrude(amount=BOSS_EXTRUDE4_DEPTH)

    # Sketch16 → Cut-Extrude11 (cut)
    with BuildSketch(Plane(origin=(0, 0, 0), x_dir=(-1, 0, 0), z_dir=(0, 0, -1))):
        with Locations((22.5, 0)):
            Circle(SKETCH16_R)
    extrude(amount=-CUT_EXTRUDE11_DEPTH, mode=Mode.SUBTRACT)


solid = body_3.part
